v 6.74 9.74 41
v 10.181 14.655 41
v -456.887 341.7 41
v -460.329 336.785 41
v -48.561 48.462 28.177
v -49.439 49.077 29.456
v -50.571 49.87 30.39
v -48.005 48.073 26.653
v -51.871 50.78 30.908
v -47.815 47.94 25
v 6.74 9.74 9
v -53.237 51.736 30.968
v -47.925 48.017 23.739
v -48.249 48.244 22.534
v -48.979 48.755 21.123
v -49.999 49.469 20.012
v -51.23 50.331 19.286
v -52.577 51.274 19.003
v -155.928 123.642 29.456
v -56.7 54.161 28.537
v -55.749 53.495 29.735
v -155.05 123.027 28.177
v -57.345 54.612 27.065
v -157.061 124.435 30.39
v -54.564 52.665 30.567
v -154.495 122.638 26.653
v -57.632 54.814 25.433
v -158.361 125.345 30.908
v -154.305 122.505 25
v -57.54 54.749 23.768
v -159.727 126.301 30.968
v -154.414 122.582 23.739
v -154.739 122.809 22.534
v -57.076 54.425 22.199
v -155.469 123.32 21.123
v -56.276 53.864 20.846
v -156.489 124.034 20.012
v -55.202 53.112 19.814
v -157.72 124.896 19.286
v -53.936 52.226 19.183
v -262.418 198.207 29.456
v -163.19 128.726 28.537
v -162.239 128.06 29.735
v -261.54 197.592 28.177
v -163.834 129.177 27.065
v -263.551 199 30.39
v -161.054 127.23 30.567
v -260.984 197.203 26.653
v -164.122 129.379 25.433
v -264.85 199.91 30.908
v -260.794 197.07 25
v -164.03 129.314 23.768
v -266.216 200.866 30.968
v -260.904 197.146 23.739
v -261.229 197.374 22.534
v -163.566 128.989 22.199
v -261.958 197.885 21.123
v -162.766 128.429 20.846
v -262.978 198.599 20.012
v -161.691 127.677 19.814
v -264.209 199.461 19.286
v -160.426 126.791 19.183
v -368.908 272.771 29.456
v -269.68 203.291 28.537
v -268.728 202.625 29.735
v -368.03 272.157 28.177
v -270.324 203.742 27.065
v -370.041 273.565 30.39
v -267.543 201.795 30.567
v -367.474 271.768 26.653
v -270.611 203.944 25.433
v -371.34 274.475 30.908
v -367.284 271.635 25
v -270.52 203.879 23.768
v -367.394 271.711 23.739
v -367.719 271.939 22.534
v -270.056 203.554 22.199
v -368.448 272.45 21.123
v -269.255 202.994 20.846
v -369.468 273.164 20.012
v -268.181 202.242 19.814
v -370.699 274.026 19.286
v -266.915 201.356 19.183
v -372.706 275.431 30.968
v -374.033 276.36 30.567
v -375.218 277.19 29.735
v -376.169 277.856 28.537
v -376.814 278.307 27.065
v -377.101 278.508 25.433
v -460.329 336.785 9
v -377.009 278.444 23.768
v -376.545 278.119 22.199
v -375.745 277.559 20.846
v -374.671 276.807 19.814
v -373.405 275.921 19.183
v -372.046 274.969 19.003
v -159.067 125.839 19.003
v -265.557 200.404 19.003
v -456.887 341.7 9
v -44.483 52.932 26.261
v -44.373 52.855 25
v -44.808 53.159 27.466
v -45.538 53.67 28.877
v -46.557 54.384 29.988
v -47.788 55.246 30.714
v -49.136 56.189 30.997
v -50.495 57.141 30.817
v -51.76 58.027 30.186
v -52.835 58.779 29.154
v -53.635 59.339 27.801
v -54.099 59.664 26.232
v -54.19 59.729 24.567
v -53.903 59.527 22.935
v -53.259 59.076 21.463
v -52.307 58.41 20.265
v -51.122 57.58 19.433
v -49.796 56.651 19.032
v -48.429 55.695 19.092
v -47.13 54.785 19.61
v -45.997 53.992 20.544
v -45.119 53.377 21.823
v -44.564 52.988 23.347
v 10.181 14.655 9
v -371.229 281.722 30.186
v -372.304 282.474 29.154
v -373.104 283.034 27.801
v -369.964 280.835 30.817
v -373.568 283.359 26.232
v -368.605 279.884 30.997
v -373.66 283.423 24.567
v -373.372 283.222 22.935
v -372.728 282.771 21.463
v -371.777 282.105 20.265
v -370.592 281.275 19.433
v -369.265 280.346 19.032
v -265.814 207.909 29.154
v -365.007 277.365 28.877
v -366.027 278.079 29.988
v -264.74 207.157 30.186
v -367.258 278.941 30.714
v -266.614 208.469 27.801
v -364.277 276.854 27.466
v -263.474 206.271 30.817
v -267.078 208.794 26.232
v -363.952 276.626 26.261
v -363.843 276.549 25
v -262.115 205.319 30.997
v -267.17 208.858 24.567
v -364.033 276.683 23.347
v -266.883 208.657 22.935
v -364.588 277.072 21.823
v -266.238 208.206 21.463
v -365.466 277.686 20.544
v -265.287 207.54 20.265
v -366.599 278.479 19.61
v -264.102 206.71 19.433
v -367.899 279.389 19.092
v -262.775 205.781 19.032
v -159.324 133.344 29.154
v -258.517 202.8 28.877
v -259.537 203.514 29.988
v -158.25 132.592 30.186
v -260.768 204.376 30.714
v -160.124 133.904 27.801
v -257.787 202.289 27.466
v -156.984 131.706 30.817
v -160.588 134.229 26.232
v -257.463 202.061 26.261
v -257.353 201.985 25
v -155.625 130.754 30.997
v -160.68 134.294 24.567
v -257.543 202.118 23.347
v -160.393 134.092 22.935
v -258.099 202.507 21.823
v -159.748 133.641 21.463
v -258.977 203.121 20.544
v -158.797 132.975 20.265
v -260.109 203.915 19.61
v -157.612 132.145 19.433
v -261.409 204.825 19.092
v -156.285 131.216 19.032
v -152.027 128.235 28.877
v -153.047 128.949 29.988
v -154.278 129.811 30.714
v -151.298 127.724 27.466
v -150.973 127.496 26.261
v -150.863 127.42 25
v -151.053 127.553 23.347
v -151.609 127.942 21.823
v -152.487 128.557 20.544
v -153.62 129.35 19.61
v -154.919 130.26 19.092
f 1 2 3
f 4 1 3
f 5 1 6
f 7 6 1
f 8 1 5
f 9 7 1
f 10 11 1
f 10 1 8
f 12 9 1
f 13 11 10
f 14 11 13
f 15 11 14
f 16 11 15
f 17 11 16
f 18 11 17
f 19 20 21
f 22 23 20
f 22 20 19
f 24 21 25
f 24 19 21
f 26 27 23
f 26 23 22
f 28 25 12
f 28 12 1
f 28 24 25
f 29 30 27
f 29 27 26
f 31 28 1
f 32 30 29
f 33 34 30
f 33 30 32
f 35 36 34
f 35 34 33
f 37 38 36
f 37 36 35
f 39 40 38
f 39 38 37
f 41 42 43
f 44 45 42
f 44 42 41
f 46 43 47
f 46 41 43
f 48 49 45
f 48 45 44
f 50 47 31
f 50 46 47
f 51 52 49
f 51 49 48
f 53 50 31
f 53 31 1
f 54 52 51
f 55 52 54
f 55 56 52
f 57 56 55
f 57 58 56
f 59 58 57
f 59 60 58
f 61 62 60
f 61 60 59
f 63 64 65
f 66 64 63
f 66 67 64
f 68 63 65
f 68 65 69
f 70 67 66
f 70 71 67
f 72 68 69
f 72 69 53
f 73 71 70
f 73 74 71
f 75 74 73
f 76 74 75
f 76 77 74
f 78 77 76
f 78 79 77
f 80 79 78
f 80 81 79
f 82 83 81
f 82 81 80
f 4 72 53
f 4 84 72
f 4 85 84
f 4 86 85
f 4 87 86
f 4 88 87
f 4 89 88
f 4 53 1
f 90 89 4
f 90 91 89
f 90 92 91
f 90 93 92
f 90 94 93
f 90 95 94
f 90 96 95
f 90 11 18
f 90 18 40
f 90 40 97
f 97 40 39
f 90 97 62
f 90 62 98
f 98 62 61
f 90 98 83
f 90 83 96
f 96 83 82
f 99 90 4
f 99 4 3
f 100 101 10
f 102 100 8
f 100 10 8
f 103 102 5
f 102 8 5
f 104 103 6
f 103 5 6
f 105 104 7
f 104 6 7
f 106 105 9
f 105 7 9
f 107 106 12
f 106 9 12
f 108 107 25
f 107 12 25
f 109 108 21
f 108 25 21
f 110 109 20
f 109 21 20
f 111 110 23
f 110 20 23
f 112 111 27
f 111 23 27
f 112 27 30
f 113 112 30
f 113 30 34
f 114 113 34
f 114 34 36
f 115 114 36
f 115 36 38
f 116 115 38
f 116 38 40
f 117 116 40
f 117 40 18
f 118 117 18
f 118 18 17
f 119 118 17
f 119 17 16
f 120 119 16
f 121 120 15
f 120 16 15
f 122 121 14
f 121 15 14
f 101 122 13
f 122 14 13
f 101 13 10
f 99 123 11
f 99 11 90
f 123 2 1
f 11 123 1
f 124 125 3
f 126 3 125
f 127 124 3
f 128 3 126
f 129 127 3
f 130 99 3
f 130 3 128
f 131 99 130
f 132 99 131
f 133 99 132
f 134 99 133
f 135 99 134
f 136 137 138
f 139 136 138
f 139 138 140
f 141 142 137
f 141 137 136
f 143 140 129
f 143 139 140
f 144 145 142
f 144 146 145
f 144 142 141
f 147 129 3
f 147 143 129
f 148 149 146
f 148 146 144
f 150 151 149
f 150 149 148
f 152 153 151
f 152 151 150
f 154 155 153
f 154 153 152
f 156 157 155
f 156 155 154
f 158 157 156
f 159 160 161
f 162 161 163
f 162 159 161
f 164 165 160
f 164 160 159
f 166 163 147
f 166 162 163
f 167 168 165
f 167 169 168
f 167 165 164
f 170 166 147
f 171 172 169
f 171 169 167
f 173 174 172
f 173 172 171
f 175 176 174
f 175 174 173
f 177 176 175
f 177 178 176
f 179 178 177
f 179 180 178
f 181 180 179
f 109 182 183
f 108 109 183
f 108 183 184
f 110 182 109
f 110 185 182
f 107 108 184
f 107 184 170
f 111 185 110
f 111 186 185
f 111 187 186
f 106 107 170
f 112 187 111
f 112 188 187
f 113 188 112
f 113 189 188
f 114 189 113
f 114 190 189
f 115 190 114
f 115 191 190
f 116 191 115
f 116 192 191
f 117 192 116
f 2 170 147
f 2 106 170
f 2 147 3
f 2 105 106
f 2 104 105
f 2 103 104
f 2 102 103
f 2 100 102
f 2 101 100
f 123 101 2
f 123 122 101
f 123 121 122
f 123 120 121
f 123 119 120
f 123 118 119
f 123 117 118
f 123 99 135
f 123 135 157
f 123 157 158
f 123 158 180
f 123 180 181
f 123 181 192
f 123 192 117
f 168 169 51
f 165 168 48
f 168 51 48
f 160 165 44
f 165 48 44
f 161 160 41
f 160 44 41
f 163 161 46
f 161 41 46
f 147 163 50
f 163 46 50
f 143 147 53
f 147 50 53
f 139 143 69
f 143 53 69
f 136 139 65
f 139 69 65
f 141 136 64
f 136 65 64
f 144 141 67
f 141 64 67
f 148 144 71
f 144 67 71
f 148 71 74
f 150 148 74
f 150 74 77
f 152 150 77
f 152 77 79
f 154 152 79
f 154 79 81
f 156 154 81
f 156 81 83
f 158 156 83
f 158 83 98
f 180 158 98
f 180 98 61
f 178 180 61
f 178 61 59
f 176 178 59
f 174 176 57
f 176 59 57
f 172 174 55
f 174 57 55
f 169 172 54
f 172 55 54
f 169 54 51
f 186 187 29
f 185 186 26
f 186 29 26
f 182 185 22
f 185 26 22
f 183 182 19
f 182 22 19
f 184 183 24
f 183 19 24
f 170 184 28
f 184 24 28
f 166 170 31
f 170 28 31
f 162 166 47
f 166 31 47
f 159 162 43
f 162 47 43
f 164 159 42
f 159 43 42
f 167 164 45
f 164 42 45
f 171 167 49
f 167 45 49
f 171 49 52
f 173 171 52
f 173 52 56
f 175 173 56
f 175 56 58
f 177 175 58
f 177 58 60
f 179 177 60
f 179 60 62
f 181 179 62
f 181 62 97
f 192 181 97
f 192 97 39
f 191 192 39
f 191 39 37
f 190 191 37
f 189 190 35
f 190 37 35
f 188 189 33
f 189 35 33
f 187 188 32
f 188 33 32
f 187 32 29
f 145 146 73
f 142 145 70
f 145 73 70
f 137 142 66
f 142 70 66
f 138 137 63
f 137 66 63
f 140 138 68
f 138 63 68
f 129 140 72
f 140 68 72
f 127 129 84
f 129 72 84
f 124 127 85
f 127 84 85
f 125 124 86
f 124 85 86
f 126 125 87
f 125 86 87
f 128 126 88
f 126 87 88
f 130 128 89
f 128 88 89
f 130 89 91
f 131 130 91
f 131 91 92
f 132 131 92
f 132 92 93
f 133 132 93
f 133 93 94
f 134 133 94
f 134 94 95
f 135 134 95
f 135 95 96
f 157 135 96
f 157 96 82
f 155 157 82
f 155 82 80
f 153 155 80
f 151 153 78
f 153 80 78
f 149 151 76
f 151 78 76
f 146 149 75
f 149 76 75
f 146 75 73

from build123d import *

# Parameters (mm, degrees)
PAD006_DEPTH           = 32
SKETCH014_R            = 6
POCKET004_DEPTH        = 273.900652
LINEARPATTERN002_COUNT = 4
LINEARPATTERN002_PITCH = 130


with BuildPart() as part:
    # Sketch013 → Pad006 (new body)
    with BuildSketch(Plane.XY):
        Polygon((-456.887332, 341.7), (10.181459, 14.654912), (6.74, 9.74), (-460.32879, 336.785088), align=None)
    extrude(amount=PAD006_DEPTH)

    # Sketch014 (on Face3 of Pad006) → Pocket004 (cut, through all)
    with BuildSketch(Plane(origin=(6.793695, 9.702402, 0), x_dir=(0.819152, -0.573576, 0), z_dir=(-0.573576, -0.819152, 0))):
        with Locations((-462.664681, 16)):
            Circle(SKETCH014_R)
    pocket004 = extrude(amount=-POCKET004_DEPTH, mode=Mode.SUBTRACT)

    # LinearPattern002: Pocket004 ×4
    with Locations(*[Vector(0.819152, -0.573576, 0) * (i * LINEARPATTERN002_PITCH) for i in range(1, LINEARPATTERN002_COUNT)]):
        add(pocket004, mode=Mode.SUBTRACT)


with BuildPart() as part_1:
    # Body005 placement: moved
    add(part.part.moved(Location((0, 0, 9))))


solid = part_1.part
